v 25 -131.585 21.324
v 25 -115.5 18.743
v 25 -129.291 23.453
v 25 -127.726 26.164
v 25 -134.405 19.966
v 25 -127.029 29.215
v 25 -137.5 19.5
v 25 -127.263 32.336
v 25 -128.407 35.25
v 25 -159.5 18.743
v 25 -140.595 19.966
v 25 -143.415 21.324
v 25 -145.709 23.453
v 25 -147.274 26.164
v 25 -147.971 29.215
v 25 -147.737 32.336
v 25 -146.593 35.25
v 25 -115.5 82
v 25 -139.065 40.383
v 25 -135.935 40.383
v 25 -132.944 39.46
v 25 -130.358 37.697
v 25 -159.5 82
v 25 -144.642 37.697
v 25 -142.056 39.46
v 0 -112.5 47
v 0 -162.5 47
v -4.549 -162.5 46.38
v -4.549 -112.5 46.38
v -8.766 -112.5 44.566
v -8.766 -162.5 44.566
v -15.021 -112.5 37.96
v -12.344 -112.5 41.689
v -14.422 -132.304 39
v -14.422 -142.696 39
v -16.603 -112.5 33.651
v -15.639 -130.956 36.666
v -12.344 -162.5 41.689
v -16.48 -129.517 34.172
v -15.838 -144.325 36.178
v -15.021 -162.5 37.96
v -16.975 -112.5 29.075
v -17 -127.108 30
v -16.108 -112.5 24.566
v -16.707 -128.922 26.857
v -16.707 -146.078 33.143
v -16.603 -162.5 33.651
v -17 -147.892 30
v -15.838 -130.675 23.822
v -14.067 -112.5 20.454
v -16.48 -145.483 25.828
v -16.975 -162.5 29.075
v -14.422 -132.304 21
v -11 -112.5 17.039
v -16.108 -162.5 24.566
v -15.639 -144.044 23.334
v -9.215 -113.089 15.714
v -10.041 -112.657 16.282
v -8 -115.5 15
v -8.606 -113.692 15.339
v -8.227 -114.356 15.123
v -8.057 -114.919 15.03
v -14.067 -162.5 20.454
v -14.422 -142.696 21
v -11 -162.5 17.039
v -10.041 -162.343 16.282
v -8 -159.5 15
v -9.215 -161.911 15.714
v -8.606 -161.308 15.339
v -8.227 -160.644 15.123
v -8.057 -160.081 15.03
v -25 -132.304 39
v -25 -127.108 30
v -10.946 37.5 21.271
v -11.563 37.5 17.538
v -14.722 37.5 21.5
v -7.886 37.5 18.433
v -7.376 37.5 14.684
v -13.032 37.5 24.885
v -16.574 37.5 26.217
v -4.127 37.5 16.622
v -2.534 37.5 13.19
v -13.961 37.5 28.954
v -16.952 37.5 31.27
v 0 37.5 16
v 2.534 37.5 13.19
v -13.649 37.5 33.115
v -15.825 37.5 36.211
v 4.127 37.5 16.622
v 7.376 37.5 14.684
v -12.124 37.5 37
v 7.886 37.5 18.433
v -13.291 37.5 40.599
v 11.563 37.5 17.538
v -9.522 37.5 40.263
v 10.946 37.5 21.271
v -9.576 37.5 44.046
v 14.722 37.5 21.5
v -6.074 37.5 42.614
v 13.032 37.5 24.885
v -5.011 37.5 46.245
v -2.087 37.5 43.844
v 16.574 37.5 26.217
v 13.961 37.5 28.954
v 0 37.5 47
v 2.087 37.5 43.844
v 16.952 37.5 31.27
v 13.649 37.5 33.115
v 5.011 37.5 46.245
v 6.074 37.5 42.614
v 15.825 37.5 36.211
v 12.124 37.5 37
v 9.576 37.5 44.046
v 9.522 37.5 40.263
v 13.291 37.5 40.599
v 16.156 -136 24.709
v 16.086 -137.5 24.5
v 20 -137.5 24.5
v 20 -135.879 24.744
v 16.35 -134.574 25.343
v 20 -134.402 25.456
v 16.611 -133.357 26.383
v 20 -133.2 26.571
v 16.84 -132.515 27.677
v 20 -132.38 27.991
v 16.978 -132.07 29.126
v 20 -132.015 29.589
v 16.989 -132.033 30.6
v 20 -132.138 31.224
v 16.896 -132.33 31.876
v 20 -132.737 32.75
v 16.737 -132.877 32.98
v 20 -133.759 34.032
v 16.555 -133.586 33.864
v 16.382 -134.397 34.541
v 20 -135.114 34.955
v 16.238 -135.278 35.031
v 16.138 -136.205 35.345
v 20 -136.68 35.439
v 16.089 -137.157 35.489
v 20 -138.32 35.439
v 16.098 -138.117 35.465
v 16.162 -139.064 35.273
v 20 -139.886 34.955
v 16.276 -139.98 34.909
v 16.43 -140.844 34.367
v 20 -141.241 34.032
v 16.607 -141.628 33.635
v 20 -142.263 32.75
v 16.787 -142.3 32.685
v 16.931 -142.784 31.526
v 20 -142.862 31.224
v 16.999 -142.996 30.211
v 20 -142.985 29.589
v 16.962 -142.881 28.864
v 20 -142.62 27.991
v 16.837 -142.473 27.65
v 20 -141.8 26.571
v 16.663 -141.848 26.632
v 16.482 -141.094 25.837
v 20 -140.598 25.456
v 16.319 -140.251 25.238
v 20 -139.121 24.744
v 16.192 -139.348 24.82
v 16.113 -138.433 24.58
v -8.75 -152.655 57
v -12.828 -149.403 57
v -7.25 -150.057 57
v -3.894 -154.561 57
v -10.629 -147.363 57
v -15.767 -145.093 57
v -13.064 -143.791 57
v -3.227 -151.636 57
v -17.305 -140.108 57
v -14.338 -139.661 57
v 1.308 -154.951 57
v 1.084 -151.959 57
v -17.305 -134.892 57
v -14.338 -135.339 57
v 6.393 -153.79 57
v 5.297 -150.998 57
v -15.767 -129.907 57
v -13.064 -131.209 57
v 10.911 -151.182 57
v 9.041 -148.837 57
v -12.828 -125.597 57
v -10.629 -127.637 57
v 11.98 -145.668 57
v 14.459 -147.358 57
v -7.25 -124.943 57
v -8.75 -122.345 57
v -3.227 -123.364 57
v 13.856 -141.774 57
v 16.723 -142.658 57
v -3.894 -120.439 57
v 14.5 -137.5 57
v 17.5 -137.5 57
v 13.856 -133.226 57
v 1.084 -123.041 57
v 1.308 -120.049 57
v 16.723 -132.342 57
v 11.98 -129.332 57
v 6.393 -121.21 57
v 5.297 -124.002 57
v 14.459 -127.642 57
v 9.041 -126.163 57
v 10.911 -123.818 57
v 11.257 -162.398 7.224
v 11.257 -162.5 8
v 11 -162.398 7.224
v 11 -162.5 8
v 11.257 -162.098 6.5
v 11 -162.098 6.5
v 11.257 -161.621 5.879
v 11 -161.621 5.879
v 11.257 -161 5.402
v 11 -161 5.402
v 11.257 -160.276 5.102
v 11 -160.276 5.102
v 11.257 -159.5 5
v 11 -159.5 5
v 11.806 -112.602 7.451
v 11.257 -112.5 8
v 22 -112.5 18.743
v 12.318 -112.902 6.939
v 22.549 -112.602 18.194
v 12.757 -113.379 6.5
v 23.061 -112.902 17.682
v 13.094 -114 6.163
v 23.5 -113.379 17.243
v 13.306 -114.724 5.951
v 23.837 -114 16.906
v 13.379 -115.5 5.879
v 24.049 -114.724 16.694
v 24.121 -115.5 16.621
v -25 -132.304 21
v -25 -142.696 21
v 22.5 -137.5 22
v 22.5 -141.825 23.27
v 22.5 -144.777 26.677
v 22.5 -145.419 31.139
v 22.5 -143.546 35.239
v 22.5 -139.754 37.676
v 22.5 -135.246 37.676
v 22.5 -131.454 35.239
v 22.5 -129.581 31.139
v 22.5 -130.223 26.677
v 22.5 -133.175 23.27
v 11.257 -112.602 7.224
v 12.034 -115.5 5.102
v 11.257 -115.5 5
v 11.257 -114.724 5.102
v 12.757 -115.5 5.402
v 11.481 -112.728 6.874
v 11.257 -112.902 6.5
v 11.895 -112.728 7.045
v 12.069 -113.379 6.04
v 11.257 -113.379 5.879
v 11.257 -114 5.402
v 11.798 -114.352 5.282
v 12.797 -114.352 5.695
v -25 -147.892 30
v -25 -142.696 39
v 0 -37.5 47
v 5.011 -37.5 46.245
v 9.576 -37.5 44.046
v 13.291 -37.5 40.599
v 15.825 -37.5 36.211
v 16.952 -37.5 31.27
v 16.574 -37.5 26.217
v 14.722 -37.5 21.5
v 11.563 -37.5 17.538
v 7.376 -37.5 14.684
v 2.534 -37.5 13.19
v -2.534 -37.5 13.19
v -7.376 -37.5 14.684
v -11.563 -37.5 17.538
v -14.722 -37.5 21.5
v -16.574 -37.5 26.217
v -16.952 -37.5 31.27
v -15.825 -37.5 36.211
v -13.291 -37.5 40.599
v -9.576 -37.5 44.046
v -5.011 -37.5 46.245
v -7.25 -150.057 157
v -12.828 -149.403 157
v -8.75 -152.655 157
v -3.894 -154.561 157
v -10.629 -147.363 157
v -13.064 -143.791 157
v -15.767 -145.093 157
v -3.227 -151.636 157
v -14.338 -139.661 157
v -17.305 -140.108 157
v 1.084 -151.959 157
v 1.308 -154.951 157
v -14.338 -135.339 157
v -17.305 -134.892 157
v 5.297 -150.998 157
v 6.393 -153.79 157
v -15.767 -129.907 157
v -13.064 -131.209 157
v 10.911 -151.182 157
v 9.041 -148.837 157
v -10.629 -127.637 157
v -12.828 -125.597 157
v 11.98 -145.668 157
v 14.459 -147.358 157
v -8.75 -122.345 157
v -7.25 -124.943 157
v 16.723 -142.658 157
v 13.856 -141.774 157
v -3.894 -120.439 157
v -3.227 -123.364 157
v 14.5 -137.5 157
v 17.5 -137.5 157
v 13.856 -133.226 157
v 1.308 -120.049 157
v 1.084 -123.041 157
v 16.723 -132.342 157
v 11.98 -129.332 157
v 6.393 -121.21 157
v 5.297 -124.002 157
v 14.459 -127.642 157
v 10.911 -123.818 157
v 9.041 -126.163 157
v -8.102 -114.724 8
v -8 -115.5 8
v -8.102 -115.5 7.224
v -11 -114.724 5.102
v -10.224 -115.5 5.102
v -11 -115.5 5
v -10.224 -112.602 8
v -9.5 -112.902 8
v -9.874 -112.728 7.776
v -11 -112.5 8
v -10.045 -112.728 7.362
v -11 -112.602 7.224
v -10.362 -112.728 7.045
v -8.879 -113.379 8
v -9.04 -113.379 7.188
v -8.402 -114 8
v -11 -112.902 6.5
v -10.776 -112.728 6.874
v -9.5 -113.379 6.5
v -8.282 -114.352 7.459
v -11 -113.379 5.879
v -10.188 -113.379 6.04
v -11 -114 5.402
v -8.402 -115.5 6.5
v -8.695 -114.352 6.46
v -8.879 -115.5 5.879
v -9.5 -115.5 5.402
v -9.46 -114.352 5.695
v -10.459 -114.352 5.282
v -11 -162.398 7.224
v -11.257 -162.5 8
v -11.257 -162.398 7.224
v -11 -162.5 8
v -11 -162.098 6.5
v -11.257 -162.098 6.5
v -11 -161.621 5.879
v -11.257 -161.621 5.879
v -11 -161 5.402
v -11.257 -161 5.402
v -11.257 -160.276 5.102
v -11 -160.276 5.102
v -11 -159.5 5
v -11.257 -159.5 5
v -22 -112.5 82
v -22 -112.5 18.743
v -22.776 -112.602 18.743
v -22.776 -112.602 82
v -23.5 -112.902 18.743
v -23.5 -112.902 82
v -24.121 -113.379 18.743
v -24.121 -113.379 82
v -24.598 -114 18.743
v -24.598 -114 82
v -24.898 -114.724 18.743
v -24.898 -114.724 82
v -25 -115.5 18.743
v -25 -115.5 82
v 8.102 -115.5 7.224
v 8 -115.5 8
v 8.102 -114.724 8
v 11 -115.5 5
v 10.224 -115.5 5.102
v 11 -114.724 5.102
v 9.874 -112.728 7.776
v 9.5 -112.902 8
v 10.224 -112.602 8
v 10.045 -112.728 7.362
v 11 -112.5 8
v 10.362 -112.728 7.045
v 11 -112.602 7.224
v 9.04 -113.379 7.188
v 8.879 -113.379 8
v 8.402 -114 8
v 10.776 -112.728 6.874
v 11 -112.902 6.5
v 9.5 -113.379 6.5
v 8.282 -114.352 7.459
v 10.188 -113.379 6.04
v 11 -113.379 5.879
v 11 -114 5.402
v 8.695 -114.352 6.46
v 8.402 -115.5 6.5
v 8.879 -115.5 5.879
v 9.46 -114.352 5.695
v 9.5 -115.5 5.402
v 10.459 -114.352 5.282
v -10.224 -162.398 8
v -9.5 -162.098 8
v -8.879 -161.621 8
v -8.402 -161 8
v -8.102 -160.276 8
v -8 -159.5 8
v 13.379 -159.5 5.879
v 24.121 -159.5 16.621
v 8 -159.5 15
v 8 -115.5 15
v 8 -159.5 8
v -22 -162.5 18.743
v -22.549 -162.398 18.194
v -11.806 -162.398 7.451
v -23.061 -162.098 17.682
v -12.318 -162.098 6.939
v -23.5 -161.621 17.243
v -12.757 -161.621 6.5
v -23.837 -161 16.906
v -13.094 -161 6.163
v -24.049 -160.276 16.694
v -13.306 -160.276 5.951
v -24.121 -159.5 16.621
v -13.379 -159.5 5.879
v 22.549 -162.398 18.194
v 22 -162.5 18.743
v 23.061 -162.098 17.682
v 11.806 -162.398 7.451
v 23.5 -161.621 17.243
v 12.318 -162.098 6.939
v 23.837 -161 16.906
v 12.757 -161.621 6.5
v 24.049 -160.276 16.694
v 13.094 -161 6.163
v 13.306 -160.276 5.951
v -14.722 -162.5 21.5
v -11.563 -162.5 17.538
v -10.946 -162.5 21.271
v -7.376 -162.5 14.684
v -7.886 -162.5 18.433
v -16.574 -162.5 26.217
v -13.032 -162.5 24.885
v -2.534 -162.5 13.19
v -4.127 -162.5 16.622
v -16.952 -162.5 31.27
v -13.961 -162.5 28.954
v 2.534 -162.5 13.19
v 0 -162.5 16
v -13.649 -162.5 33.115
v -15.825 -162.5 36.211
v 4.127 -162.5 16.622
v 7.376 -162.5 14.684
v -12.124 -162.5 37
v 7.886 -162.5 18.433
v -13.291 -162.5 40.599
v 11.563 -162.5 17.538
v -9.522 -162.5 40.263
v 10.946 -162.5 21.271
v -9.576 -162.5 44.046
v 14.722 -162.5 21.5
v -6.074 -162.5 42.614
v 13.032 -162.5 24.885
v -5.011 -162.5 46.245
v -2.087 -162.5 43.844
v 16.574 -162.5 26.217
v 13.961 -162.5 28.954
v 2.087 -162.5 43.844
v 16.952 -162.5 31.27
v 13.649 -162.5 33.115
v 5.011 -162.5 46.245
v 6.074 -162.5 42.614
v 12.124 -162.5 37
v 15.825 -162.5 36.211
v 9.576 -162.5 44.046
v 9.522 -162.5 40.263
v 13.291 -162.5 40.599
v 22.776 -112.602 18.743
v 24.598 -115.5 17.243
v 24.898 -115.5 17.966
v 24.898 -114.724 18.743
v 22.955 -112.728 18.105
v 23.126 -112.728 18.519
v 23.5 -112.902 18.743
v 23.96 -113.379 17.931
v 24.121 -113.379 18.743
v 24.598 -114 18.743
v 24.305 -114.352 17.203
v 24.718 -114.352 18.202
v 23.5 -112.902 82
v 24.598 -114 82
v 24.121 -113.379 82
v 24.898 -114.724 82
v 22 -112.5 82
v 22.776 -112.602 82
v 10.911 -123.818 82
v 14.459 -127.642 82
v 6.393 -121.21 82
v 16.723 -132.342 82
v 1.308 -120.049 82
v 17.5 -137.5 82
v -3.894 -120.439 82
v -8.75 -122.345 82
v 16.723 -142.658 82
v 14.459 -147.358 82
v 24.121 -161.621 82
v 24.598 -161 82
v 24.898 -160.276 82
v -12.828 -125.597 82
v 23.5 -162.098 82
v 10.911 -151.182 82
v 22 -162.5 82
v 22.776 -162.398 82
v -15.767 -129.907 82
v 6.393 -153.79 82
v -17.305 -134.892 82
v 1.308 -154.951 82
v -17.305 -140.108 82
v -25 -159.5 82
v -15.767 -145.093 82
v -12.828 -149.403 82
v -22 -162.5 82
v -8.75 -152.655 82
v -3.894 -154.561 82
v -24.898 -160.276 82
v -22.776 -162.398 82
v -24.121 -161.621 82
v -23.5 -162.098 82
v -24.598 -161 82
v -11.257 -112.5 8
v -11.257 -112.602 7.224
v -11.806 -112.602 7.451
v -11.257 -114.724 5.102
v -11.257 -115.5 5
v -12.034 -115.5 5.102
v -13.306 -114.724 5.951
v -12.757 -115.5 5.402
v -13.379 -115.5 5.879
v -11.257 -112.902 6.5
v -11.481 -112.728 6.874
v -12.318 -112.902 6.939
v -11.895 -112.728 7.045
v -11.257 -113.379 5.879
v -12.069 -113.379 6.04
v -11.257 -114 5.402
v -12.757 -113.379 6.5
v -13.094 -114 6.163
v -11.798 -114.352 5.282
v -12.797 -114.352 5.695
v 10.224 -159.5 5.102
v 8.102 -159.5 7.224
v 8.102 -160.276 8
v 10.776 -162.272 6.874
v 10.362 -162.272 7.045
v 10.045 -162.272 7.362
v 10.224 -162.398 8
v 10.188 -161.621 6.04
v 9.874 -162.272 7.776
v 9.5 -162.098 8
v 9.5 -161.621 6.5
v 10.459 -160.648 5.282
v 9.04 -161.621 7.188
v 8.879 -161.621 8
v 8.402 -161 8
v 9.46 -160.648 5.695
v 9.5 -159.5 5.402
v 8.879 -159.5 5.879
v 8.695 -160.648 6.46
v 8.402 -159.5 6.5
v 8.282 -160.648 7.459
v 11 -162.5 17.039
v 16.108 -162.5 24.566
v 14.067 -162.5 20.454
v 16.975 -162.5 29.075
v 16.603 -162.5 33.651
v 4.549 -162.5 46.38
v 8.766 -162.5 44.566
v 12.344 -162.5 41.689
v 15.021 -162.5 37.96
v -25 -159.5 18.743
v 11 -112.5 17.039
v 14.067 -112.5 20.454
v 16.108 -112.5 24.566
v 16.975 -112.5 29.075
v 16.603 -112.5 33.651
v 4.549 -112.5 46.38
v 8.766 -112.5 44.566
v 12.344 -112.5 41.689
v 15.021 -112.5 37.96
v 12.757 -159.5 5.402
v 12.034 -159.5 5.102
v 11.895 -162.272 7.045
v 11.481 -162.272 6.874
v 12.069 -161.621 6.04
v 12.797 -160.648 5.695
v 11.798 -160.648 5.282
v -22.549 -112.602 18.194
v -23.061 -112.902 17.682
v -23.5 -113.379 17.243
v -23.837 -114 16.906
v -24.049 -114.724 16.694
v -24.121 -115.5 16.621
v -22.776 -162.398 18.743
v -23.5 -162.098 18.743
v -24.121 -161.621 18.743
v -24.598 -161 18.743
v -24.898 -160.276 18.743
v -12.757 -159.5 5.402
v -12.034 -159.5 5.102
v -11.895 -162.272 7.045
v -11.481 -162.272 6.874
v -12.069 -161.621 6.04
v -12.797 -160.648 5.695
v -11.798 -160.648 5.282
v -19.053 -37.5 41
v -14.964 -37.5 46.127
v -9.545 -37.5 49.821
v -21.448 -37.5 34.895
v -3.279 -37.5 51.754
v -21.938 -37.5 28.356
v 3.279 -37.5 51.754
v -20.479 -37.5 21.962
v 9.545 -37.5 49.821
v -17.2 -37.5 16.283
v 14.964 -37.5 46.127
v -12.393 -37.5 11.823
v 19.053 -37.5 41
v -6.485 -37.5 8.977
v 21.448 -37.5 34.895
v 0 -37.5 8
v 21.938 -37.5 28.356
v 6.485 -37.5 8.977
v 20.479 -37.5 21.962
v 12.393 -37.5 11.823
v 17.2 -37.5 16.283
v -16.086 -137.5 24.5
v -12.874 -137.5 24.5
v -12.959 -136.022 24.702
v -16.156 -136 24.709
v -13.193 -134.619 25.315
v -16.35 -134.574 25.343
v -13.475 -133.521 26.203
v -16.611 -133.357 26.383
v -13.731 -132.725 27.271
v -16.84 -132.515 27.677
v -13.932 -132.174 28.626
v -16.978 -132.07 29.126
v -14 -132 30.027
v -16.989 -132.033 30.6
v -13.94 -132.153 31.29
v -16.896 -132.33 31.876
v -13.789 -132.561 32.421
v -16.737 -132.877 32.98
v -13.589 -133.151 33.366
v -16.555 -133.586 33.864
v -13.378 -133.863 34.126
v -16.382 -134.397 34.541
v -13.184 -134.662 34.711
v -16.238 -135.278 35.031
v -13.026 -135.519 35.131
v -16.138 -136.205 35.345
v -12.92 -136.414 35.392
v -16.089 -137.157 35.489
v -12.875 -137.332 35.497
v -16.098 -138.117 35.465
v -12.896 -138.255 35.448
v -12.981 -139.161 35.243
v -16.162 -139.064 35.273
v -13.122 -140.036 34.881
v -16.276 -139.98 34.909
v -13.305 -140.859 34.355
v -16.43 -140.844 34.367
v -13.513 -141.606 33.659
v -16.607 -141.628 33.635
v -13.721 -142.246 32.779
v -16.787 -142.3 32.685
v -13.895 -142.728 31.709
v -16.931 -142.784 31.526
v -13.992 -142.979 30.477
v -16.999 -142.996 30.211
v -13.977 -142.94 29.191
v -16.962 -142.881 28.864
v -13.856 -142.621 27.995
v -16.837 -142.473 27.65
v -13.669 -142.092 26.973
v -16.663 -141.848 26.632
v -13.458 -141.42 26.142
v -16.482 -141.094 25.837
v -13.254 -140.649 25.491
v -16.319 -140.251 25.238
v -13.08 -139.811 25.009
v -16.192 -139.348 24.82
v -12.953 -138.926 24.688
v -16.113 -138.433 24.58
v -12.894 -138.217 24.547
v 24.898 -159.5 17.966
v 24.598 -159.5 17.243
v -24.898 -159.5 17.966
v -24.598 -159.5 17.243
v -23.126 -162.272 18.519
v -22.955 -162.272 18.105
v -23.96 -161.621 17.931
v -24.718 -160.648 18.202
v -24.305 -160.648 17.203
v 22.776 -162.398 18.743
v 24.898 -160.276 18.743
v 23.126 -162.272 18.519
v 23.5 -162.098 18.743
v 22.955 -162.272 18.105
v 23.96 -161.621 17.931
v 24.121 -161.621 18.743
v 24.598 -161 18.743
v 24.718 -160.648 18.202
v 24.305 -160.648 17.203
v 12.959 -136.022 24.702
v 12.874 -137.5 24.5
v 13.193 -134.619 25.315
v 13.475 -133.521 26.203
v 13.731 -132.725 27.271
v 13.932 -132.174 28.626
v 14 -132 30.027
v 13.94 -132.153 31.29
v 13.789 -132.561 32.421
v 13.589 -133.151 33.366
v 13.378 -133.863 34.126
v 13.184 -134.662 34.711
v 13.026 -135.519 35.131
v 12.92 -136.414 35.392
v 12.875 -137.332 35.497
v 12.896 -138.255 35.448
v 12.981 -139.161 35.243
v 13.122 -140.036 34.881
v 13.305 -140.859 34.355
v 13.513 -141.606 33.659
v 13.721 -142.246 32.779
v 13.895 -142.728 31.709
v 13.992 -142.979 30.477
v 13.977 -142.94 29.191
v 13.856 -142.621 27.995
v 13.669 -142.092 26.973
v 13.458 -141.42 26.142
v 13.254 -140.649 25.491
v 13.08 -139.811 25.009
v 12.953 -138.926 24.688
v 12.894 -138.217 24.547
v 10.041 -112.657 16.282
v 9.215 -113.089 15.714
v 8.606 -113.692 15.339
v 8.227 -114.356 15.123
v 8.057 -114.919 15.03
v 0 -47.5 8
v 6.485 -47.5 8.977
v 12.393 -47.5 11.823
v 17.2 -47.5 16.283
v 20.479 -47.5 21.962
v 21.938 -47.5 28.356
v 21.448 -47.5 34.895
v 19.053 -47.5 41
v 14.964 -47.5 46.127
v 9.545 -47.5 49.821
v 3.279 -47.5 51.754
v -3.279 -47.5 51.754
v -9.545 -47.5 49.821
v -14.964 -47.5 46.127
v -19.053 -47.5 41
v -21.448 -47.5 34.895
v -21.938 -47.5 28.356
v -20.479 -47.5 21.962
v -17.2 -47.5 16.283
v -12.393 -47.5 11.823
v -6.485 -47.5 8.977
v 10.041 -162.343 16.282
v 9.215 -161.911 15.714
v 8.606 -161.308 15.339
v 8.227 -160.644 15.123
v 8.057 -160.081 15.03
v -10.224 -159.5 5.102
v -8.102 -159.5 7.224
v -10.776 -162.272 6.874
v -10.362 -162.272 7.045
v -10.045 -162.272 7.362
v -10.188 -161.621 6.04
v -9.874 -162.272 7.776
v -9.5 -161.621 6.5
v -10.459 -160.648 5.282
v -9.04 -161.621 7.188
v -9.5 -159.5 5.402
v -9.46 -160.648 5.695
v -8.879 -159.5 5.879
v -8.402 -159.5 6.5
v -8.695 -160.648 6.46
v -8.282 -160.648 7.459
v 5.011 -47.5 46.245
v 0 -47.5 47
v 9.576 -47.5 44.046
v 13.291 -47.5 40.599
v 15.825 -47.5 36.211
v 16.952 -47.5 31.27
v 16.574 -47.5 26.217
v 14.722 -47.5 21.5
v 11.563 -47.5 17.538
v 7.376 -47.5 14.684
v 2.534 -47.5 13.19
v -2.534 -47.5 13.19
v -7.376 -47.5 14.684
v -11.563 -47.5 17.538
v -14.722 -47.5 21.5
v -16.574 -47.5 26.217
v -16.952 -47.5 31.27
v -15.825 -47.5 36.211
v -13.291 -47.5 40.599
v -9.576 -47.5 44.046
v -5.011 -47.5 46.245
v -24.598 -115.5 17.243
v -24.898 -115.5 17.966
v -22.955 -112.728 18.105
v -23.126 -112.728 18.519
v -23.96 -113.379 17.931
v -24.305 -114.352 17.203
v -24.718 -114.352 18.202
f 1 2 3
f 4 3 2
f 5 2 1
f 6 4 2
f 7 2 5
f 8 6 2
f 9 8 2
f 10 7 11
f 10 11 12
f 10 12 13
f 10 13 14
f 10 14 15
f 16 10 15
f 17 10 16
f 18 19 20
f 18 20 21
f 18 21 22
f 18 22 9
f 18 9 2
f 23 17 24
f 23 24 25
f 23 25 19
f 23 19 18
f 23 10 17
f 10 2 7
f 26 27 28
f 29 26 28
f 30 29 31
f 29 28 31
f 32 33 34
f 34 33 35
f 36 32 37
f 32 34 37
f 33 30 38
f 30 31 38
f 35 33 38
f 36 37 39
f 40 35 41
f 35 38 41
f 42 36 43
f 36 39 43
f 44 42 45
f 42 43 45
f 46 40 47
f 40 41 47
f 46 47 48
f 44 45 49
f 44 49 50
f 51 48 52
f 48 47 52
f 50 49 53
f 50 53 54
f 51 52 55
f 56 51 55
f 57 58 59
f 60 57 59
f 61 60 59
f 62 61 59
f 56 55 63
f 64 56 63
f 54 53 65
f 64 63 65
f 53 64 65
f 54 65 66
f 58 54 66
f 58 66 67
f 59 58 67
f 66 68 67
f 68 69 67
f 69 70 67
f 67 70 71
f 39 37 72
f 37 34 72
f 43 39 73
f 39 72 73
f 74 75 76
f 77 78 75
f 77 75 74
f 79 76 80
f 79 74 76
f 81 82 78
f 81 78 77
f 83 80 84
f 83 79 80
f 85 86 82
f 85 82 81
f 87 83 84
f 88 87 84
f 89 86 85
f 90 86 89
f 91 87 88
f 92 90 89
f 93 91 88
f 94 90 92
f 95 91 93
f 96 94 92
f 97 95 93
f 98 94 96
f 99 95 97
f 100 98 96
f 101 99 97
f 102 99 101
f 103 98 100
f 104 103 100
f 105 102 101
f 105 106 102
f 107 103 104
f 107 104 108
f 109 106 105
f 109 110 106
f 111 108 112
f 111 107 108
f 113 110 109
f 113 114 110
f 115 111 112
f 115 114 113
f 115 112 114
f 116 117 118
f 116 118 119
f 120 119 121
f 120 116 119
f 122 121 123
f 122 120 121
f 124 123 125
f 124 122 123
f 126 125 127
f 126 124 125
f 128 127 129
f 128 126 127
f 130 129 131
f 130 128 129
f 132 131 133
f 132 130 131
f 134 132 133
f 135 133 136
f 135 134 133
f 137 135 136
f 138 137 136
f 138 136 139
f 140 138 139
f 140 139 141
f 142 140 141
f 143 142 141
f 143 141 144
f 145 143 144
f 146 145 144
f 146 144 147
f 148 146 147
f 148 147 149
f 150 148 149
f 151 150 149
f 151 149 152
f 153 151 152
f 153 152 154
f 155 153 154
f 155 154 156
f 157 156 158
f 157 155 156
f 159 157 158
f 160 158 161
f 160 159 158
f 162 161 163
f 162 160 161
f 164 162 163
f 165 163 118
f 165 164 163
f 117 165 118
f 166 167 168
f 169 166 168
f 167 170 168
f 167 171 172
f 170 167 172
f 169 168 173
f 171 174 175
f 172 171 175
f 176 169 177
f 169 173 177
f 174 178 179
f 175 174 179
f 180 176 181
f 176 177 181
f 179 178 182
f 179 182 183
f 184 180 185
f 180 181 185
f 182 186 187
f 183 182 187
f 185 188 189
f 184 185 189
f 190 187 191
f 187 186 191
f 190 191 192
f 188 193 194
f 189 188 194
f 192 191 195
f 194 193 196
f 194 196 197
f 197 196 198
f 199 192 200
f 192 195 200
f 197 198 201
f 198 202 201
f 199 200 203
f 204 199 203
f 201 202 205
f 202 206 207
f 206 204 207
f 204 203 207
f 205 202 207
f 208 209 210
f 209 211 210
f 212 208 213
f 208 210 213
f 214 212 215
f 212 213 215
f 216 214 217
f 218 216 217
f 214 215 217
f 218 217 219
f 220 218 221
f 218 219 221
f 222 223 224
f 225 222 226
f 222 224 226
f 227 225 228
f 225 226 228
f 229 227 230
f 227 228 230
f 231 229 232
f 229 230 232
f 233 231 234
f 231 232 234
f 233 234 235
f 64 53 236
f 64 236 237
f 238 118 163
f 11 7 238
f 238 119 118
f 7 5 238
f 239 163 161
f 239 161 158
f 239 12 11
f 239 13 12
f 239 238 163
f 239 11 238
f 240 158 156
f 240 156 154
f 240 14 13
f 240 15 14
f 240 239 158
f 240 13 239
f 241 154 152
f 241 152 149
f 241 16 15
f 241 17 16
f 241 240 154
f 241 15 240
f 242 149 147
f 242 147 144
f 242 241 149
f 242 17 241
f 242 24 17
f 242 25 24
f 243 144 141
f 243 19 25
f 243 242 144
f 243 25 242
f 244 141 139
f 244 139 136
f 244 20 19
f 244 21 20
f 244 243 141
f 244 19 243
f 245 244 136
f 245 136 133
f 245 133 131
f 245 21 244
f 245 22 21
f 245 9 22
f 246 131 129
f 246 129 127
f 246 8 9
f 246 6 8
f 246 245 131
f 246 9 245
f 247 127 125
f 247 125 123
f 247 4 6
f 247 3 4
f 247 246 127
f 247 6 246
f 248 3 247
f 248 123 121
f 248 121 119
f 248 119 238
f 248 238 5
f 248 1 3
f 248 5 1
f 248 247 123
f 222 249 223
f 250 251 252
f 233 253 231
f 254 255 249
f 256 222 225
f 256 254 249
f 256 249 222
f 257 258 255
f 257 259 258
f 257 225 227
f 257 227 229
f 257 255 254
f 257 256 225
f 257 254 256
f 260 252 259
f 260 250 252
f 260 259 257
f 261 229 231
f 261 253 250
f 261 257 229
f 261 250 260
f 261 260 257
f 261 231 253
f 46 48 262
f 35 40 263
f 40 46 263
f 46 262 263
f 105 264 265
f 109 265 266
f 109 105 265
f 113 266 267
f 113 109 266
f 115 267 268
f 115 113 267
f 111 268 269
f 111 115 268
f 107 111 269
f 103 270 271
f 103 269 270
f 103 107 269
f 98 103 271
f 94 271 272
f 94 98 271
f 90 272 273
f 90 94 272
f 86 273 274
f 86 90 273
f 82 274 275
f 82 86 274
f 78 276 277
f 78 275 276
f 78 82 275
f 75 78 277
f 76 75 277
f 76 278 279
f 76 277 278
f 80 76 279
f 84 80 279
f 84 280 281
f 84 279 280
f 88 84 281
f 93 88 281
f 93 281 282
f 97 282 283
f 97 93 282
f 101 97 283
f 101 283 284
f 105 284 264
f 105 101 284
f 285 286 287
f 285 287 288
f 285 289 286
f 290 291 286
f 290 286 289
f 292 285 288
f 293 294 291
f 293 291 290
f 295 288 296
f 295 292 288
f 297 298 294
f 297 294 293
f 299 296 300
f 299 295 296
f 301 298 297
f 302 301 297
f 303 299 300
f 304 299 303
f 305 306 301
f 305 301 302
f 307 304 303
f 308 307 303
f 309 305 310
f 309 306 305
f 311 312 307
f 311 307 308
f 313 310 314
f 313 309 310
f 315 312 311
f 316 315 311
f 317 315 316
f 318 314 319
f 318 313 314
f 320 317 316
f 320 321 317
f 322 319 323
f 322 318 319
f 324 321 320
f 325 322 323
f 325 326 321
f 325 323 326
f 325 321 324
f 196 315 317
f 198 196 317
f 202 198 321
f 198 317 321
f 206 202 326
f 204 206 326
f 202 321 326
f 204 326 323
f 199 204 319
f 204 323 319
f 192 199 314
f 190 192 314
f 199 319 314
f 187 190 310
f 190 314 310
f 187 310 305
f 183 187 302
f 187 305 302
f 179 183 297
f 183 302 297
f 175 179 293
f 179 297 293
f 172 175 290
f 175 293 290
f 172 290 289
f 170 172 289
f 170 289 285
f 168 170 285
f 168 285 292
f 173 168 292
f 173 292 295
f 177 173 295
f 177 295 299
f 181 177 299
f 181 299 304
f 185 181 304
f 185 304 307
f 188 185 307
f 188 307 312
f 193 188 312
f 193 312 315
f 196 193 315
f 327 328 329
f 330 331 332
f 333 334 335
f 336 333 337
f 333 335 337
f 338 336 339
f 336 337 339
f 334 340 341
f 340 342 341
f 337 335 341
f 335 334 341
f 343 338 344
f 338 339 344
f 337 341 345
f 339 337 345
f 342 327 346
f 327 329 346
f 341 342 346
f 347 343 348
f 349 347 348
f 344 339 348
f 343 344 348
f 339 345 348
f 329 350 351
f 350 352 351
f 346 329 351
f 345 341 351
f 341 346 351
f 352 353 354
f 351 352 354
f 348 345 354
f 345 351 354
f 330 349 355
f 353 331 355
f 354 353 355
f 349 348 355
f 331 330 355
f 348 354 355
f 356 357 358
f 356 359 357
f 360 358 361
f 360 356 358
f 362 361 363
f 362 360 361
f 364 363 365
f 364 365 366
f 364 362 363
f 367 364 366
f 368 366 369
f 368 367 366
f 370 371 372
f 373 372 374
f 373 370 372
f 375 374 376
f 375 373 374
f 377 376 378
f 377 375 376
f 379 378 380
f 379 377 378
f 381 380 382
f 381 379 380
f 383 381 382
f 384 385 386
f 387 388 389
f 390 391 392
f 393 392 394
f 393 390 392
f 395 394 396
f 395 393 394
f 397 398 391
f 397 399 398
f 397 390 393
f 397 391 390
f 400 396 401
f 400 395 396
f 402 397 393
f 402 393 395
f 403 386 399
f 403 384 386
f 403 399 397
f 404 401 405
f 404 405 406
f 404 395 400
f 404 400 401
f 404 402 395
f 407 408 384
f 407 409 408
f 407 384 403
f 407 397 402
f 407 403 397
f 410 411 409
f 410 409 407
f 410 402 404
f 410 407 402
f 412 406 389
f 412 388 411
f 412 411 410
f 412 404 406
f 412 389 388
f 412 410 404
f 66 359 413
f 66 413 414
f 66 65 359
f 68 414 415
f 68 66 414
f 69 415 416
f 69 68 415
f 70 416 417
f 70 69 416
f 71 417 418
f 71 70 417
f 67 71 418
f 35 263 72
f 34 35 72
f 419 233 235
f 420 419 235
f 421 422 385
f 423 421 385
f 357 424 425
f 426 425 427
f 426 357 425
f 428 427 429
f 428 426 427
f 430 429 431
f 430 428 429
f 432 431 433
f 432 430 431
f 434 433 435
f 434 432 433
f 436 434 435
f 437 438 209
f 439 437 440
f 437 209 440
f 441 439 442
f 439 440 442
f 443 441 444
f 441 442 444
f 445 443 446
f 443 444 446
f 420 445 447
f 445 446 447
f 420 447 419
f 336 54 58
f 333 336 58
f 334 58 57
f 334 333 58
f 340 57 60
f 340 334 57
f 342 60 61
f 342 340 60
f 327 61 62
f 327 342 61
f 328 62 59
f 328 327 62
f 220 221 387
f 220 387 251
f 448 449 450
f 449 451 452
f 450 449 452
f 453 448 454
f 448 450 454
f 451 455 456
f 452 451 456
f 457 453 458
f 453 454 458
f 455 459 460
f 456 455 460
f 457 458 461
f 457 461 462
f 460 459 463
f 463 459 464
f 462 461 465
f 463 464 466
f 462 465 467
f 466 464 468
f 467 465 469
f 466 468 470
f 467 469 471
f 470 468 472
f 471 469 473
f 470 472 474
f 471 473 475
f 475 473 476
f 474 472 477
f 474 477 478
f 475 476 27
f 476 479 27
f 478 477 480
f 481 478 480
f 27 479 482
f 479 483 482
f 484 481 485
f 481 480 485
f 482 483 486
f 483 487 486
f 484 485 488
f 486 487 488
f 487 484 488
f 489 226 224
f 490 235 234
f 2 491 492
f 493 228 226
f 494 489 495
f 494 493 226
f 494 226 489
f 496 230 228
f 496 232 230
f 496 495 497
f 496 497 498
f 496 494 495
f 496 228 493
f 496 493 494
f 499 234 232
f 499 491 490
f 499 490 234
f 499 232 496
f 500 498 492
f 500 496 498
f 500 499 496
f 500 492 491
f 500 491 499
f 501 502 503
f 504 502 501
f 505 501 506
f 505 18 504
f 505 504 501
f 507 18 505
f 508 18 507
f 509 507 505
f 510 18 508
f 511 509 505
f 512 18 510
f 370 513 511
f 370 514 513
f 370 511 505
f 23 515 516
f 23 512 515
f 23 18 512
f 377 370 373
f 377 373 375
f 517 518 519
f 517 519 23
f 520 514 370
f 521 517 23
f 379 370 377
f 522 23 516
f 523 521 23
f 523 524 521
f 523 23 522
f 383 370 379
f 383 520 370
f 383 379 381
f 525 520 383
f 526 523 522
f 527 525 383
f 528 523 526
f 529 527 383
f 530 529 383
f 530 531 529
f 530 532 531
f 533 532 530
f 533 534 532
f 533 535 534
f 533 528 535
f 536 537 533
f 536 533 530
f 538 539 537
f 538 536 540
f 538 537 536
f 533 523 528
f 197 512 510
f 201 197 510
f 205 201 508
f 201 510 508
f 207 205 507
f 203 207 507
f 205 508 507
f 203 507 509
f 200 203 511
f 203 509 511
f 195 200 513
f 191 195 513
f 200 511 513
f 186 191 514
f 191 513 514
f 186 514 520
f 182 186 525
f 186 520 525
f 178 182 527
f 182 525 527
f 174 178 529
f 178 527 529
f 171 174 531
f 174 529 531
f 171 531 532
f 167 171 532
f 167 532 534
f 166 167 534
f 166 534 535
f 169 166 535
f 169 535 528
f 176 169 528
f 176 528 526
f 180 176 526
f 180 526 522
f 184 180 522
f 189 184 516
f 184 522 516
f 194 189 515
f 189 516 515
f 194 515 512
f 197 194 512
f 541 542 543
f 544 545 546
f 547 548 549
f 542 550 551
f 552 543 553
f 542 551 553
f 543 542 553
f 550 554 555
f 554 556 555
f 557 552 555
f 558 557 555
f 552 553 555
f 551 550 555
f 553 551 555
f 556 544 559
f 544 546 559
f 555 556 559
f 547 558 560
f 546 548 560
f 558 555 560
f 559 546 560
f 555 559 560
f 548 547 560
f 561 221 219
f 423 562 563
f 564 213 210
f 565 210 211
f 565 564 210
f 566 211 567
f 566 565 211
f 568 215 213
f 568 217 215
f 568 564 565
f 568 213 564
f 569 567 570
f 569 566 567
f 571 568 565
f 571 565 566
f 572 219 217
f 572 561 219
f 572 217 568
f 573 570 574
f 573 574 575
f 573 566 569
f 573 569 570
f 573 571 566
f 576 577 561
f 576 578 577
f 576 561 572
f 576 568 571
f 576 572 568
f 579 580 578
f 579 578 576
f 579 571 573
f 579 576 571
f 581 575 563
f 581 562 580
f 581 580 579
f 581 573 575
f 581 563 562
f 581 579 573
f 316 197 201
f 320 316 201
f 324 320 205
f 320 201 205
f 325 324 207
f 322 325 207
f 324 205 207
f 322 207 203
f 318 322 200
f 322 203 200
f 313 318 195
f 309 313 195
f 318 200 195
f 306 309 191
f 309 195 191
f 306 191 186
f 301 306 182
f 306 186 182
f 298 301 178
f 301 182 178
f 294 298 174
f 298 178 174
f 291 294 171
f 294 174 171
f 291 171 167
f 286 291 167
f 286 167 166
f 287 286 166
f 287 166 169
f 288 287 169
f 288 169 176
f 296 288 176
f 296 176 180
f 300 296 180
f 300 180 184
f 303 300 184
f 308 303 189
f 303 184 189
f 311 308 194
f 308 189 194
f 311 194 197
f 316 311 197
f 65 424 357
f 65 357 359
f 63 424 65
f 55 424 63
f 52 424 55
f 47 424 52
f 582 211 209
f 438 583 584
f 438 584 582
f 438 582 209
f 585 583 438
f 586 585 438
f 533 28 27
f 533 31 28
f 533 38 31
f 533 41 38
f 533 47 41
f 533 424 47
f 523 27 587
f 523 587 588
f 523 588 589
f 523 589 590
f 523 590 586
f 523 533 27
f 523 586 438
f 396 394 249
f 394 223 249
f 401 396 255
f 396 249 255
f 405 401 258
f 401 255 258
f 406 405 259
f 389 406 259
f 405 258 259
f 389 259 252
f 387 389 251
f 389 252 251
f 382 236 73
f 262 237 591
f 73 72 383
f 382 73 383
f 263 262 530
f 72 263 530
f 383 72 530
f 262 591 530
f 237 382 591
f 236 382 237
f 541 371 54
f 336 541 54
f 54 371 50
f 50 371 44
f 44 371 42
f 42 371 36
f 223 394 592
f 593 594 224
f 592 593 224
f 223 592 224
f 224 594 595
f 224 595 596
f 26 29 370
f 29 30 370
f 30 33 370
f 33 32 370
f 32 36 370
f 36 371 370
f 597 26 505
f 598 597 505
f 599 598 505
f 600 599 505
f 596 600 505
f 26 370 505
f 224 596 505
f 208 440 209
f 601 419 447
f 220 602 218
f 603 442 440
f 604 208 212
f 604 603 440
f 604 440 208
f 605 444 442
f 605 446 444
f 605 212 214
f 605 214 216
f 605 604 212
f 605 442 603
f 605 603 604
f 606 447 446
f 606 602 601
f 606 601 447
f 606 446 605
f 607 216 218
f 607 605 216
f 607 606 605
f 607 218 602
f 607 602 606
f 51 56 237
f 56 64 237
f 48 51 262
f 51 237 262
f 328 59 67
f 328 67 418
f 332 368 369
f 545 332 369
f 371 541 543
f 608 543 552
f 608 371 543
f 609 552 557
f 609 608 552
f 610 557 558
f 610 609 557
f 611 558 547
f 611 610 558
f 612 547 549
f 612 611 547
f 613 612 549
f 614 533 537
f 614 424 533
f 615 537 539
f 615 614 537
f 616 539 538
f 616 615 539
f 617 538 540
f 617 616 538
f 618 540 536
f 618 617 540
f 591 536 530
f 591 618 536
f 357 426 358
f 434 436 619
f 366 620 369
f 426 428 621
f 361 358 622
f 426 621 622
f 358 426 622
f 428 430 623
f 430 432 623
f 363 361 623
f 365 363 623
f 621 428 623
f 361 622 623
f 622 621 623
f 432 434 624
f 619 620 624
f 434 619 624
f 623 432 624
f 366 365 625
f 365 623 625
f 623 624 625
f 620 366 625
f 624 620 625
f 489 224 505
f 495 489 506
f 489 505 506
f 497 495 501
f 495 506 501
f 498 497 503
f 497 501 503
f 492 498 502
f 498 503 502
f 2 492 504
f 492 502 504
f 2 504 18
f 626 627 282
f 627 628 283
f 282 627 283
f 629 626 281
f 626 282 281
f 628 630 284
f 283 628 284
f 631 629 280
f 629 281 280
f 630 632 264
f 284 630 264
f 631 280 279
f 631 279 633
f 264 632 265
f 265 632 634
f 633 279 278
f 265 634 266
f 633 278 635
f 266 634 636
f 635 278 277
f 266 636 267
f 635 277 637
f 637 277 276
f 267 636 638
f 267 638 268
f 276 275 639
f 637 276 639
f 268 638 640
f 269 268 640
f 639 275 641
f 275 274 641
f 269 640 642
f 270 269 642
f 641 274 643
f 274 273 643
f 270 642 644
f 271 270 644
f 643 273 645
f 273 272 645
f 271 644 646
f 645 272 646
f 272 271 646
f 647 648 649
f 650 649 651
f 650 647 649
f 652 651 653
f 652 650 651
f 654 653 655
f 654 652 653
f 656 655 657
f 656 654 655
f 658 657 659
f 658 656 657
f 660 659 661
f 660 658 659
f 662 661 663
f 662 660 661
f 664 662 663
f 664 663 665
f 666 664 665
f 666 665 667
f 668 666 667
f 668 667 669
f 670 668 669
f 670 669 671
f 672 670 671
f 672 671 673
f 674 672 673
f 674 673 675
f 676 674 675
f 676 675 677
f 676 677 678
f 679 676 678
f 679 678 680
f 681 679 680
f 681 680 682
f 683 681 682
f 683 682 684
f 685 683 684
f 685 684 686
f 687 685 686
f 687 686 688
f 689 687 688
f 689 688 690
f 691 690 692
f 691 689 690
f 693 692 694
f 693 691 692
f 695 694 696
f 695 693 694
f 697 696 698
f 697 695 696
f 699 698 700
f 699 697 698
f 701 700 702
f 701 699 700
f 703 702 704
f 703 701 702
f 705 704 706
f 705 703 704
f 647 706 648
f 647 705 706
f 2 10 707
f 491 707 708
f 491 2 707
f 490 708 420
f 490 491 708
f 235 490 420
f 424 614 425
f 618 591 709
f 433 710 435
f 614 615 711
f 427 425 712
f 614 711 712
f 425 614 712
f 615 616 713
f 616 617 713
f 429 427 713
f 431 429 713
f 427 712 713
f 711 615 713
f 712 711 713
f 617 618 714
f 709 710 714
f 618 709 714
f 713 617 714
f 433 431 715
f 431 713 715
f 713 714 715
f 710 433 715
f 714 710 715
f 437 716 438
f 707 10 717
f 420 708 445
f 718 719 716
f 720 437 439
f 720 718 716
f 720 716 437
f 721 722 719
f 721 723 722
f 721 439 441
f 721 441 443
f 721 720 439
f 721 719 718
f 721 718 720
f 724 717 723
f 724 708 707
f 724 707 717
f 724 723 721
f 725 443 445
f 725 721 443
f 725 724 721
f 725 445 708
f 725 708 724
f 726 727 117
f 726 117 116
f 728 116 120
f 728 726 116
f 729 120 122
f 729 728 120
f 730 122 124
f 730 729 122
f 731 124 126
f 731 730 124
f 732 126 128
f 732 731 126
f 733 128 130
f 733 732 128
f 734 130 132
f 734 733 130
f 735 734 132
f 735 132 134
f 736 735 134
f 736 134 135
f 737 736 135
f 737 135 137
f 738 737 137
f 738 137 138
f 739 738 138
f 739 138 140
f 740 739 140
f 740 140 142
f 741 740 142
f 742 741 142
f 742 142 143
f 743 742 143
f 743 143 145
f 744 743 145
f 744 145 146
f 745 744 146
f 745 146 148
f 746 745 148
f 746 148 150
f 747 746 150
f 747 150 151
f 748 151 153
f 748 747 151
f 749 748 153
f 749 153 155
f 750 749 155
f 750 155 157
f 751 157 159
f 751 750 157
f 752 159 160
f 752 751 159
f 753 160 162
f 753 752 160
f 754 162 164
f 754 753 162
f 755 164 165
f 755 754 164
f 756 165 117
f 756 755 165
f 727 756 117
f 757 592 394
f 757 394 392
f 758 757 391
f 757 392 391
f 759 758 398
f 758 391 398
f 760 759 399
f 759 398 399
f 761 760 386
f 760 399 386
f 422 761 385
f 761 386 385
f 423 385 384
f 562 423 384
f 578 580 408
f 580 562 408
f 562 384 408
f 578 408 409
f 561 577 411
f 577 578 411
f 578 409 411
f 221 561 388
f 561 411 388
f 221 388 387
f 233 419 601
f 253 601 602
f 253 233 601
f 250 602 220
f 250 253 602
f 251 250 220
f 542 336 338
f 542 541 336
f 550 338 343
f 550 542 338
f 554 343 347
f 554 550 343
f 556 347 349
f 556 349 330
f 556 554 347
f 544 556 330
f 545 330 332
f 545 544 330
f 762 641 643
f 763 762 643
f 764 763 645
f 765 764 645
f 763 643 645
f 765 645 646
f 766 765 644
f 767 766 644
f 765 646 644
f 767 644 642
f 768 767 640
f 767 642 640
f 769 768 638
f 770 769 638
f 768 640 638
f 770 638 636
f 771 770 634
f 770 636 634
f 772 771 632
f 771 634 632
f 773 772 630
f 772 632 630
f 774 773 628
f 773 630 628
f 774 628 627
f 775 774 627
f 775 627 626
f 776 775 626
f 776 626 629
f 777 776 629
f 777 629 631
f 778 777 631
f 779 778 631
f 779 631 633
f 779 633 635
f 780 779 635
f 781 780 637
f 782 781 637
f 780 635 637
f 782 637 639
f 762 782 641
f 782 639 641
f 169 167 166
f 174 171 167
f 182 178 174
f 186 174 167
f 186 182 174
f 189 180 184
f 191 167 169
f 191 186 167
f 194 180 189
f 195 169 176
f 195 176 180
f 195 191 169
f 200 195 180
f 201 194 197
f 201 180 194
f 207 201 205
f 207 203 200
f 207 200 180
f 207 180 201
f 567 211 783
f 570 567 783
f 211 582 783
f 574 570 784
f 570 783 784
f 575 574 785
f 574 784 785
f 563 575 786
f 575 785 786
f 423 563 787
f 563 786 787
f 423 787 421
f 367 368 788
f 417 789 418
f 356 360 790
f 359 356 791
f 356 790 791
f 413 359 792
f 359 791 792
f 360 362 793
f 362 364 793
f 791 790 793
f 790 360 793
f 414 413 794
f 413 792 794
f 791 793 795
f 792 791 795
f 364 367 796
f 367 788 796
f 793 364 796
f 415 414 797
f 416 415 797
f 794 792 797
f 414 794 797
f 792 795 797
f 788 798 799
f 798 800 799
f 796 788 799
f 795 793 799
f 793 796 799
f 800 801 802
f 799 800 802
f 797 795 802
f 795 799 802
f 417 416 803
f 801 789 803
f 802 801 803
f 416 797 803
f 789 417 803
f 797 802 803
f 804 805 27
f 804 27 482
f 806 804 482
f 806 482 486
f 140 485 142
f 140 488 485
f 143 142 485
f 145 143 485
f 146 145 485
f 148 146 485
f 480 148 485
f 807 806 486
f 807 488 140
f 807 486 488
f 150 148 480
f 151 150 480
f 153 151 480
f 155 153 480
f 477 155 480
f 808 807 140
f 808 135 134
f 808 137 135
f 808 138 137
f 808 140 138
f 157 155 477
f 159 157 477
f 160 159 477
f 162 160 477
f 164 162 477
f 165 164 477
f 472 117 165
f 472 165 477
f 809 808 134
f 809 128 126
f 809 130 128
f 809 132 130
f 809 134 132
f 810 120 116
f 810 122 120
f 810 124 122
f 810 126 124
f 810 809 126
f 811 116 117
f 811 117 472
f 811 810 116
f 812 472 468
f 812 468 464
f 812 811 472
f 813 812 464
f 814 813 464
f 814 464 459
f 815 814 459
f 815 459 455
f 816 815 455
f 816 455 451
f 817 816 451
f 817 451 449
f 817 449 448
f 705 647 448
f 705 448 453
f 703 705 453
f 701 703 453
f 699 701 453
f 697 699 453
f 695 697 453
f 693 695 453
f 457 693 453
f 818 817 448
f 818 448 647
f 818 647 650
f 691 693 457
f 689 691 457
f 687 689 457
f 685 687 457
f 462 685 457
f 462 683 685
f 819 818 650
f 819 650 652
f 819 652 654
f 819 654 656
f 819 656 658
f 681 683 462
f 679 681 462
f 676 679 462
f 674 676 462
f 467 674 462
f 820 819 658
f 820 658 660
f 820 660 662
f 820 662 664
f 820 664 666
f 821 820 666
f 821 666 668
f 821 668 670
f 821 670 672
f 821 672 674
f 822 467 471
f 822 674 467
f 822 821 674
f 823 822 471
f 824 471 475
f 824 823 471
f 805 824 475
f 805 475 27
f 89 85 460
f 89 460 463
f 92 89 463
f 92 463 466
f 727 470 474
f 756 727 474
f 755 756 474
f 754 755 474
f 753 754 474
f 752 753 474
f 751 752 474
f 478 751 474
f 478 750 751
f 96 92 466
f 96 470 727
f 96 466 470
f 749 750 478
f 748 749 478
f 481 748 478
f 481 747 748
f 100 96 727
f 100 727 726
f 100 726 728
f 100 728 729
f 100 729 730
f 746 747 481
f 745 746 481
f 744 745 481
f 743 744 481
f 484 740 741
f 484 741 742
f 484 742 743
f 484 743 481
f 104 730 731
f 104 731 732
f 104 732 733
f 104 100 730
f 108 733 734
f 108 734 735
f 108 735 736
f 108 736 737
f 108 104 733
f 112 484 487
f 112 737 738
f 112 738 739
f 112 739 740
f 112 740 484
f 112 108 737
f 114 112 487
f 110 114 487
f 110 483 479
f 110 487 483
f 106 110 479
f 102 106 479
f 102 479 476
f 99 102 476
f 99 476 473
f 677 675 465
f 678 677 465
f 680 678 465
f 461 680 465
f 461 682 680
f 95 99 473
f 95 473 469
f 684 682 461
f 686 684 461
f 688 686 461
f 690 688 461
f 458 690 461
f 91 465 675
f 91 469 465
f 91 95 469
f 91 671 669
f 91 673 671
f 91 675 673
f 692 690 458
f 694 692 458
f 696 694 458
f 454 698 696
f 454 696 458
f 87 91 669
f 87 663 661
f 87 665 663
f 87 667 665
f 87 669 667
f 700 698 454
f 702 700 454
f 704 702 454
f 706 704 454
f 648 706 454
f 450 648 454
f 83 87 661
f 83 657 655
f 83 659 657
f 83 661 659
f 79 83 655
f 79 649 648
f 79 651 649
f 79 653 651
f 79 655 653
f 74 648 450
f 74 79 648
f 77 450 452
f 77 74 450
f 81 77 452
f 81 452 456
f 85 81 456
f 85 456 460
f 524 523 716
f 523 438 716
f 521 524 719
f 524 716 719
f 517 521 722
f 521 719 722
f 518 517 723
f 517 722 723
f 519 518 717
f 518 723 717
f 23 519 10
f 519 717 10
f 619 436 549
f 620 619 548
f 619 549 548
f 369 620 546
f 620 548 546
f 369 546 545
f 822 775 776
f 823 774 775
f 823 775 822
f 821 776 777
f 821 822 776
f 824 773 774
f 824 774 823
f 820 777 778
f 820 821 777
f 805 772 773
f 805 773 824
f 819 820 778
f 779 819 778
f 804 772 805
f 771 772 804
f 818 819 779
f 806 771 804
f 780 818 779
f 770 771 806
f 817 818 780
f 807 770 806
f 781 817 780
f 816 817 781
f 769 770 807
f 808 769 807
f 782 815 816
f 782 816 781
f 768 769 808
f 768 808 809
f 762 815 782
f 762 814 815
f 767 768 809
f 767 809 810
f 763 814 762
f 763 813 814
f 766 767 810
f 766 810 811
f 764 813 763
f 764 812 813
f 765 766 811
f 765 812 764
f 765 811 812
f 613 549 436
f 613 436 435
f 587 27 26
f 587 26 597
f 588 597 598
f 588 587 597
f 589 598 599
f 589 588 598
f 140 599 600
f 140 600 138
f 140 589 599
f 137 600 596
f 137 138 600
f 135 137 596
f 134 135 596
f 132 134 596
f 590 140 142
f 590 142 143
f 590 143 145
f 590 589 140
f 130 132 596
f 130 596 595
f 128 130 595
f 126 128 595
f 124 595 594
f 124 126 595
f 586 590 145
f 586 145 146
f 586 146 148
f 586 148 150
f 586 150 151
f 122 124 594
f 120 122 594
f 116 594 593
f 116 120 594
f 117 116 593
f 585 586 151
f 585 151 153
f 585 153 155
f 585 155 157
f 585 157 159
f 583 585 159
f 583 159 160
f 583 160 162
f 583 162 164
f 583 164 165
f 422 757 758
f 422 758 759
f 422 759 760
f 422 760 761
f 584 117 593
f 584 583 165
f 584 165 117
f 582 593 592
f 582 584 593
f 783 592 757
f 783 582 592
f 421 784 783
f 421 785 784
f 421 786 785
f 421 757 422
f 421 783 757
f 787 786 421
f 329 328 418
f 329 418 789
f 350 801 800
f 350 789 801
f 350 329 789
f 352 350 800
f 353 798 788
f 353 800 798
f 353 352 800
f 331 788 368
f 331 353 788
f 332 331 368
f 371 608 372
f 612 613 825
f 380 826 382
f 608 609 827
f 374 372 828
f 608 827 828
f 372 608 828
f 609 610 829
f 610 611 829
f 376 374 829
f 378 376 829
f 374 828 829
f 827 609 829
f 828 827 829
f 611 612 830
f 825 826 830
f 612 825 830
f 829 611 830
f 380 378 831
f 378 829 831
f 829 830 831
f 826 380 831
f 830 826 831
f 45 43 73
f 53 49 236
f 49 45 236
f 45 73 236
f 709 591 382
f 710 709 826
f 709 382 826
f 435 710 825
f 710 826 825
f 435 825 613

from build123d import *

# Parameters (mm, degrees)
SKETCH1_W               = 75
SKETCH1_H               = 75
BOSS_EXTRUDE1_DEPTH     = 8
FILLET1_R               = 10
SKETCH2_R               = 17.5
BOSS_EXTRUDE2_DEPTH     = 37.5
SKETCH3_R               = 17
BOSS_EXTRUDE3_DEPTH     = 200
SKETCH4_R               = 22
SKETCH4_R_2             = 17
BOSS_EXTRUDE4_DEPTH     = 10
BOSS_EXTRUDE5_DEPTH     = 50
SKETCH6_R               = 17.5
CUT_EXTRUDE1_DEPTH      = 25
SKETCH7_R               = 17.5
BOSS_EXTRUDE6_DEPTH     = 100
CUT_EXTRUDE2_DEPTH      = 235.438691346
CUT_EXTRUDE2_DEPTH_BACK = 235.438691346
SKETCH8_R               = 5.5
CUT_EXTRUDE3_DEPTH      = 258.012159245
CUT_EXTRUDE3_DEPTH_BACK = 258.012159245
SKETCH10_R              = 14
CHAMFER1_SIZE           = 5
CUT_EXTRUDE4_DEPTH      = 12
FILLET3_R               = 3
FILLET2_R               = 3
SKETCH12_R              = 14.5
CUT_EXTRUDE5_DEPTH      = 224.909021776


with BuildPart() as part:
    # Sketch1 → Boss-Extrude1 (new body)
    with BuildSketch(Plane.XY):
        Rectangle(SKETCH1_W, SKETCH1_H)
    extrude(amount=BOSS_EXTRUDE1_DEPTH)

    # Fillet1
    fillet1_edges = [part.edges().sort_by_distance(p)[0] for p in [
        (37.5, -37.5, 4),
        (-37.5, -37.5, 4),
        (-37.5, 37.5, 4),
        (37.5, 37.5, 4),
    ]]
    fillet(fillet1_edges, radius=FILLET1_R)

    # Sketch2 → Boss-Extrude2 (add, symmetric)
    with BuildSketch(Plane(origin=(0, 0, 0), x_dir=(1, 0, 0), z_dir=(0, 1, 0))):
        with BuildLine():
            Line((-27.5, -8), (-27.5, -30))
            ThreePointArc((-27.5, -30), (0, -57.5), (27.5, -30))
            Line((27.5, -30), (27.5, -8))
            Line((27.5, -8), (-27.5, -8))
        make_face()
        with Locations(Location((0, -30, 0), (0, 0, 270))):
            Circle(SKETCH2_R, mode=Mode.SUBTRACT)
    extrude(amount=BOSS_EXTRUDE2_DEPTH, both=True)


with BuildPart() as body_2:
    # Sketch3 → Boss-Extrude3 (new body)
    with BuildSketch(Plane(origin=(0, 37.5, 0), x_dir=(1, 0, 0), z_dir=(0, 1, 0))):
        with Locations(Location((0, -30, 0), (0, 0, 270))):
            Circle(SKETCH3_R)
    extrude(amount=-BOSS_EXTRUDE3_DEPTH)

    # Sketch4 → Boss-Extrude4 (add)
    with BuildSketch(Plane.XZ.offset(37.5)):
        with Locations(Location((0, 30, 0), (0, 0, 270))):
            Circle(SKETCH4_R)
        with Locations(Location((0, 30, 0), (0, 0, 90))):
            Circle(SKETCH4_R_2, mode=Mode.SUBTRACT)
    extrude(amount=BOSS_EXTRUDE4_DEPTH)


with BuildPart() as body_3:
    # Sketch5 → Boss-Extrude5 (new body)
    with BuildSketch(Plane.XZ.offset(162.5)):
        with BuildLine():
            Line((-8, 15), (-8, 5))
            Line((-8, 5), (-12.5, 5))
            Line((-12.5, 5), (-25, 17.5))
            Line((-25, 17.5), (-25, 82))
            Line((-25, 82), (0, 82))
            Line((0, 82), (0, 47))
            ThreePointArc((0, 47), (-16.492422502, 34.123105626), (-8, 15))
        make_face()
    extrude(amount=-BOSS_EXTRUDE5_DEPTH)

    # Mirror1: body 3 across plane


with BuildPart() as body_3_1:
    add(body_3.part)
    add(body_3.part.mirror(Plane(origin=(0, -112.5, 82), x_dir=(0, 0, 1), z_dir=(1, 0, 0))))

    # Sketch6 → Cut-Extrude1 (cut)
    with BuildSketch(Plane.XY.offset(82)):
        with Locations((0, -137.5)):
            Circle(SKETCH6_R)
    extrude(amount=-CUT_EXTRUDE1_DEPTH, mode=Mode.SUBTRACT)


with BuildPart() as body_4:
    # Sketch7 → Boss-Extrude6 (new body)
    with BuildSketch(Plane.XY.offset(57)):
        with Locations((0, -137.5)):
            Circle(SKETCH7_R)
    extrude(amount=BOSS_EXTRUDE6_DEPTH)

    # Sketch12 → Cut-Extrude5 (cut, through all)
    with BuildSketch(Plane.XY.offset(157)):
        with Locations((0, -137.5)):
            Circle(SKETCH12_R)
    extrude(amount=-CUT_EXTRUDE5_DEPTH, mode=Mode.SUBTRACT)


with BuildPart() as cut_extrude2_tool:
    # Sketch8 → Cut-Extrude2 (new, two sides: drawn at the far end of the back side and taken through both)
    with BuildSketch(Plane(origin=(25, 0, 0), x_dir=(0, 0, -1), z_dir=(1, 0, 0)).offset(-CUT_EXTRUDE2_DEPTH_BACK)):
        with Locations((-30, -137.5)):
            Circle(SKETCH8_R)
    extrude(amount=CUT_EXTRUDE2_DEPTH + CUT_EXTRUDE2_DEPTH_BACK)


with BuildPart() as body_2_1:
    add(body_2.part)

    # Cut-Extrude2: cut by cut_extrude2_tool
    add(cut_extrude2_tool.part, mode=Mode.SUBTRACT)

    # Sketch10 → Cut-Extrude3 (cut, two sides: drawn at the far end of the back side and taken through both)
    with BuildSketch(Plane.XZ.offset(162.5).offset(-CUT_EXTRUDE3_DEPTH_BACK)):
        with Locations(Location((0, 30, 0), (0, 0, 270))):
            Circle(SKETCH10_R)
    extrude(amount=CUT_EXTRUDE3_DEPTH + CUT_EXTRUDE3_DEPTH_BACK, mode=Mode.SUBTRACT)


with BuildPart() as body_3_2:
    add(body_3_1.part)

    # Cut-Extrude2: cut by cut_extrude2_tool
    add(cut_extrude2_tool.part, mode=Mode.SUBTRACT)

    # Chamfer1
    chamfer1_edges = [body_3_2.edges().sort_by_distance(p)[0] for p in [
        (25, -137.5, 35.5),
    ]]
    chamfer(chamfer1_edges, length=CHAMFER1_SIZE)

    # Sketch11 → Cut-Extrude4 (cut)
    with BuildSketch(Plane.ZY.offset(25)):
        Polygon((39, -142.696152423), (39, -132.303847577), (30, -127.107695155), (21, -132.303847577), (21, -142.696152423), (30, -147.892304845), align=None)
    extrude(amount=-CUT_EXTRUDE4_DEPTH, mode=Mode.SUBTRACT)

    # Fillet3
    fillet3_edges = [body_3_2.edges().sort_by_distance(p)[0] for p in [
        (-8, -137.5, 5),
        (-12.5, -137.5, 5),
        (-25, -137.5, 17.5),
        (8, -137.5, 5),
        (12.5, -137.5, 5),
        (25, -137.5, 17.5),
    ]]
    fillet(fillet3_edges, radius=FILLET3_R)

    # Fillet2
    fillet2_edges = [body_3_2.edges().sort_by_distance(p)[0] for p in [
        (12.40540961, -162.5, 5.228361402),
        (-12.40540961, -162.5, 5.228361402),
        (-11.128679656, -112.5, 5),
        (-8, -112.5, 11.5),
        (18.75, -112.5, 11.25),
        (11.128679656, -112.5, 5),
        (8, -112.5, 11.5),
        (-24.771638598, -112.5, 17.59459039),
        (24.771638598, -112.5, 17.59459039),
        (-8.878679656, -112.5, 5.878679656),
        (8.878679656, -112.5, 5.878679656),
        (12.40540961, -112.5, 5.228361402),
        (-12.40540961, -112.5, 5.228361402),
        (-25, -112.5, 50.371320344),
        (25, -162.5, 50.371320344),
        (25, -112.5, 50.371320344),
        (-25, -162.5, 50.371320344),
        (-18.75, -162.5, 11.25),
        (-18.75, -112.5, 11.25),
        (8, -162.5, 11.5),
        (11.128679656, -162.5, 5),
        (18.75, -162.5, 11.25),
        (-11.128679656, -162.5, 5),
        (-8, -162.5, 11.5),
        (-24.771638598, -162.5, 17.59459039),
        (24.771638598, -162.5, 17.59459039),
        (-8.878679656, -162.5, 5.878679656),
        (8.878679656, -162.5, 5.878679656),
    ]]
    fillet(fillet2_edges, radius=FILLET2_R)


solid = Compound([body_4.part, body_2_1.part, body_3_2.part])
